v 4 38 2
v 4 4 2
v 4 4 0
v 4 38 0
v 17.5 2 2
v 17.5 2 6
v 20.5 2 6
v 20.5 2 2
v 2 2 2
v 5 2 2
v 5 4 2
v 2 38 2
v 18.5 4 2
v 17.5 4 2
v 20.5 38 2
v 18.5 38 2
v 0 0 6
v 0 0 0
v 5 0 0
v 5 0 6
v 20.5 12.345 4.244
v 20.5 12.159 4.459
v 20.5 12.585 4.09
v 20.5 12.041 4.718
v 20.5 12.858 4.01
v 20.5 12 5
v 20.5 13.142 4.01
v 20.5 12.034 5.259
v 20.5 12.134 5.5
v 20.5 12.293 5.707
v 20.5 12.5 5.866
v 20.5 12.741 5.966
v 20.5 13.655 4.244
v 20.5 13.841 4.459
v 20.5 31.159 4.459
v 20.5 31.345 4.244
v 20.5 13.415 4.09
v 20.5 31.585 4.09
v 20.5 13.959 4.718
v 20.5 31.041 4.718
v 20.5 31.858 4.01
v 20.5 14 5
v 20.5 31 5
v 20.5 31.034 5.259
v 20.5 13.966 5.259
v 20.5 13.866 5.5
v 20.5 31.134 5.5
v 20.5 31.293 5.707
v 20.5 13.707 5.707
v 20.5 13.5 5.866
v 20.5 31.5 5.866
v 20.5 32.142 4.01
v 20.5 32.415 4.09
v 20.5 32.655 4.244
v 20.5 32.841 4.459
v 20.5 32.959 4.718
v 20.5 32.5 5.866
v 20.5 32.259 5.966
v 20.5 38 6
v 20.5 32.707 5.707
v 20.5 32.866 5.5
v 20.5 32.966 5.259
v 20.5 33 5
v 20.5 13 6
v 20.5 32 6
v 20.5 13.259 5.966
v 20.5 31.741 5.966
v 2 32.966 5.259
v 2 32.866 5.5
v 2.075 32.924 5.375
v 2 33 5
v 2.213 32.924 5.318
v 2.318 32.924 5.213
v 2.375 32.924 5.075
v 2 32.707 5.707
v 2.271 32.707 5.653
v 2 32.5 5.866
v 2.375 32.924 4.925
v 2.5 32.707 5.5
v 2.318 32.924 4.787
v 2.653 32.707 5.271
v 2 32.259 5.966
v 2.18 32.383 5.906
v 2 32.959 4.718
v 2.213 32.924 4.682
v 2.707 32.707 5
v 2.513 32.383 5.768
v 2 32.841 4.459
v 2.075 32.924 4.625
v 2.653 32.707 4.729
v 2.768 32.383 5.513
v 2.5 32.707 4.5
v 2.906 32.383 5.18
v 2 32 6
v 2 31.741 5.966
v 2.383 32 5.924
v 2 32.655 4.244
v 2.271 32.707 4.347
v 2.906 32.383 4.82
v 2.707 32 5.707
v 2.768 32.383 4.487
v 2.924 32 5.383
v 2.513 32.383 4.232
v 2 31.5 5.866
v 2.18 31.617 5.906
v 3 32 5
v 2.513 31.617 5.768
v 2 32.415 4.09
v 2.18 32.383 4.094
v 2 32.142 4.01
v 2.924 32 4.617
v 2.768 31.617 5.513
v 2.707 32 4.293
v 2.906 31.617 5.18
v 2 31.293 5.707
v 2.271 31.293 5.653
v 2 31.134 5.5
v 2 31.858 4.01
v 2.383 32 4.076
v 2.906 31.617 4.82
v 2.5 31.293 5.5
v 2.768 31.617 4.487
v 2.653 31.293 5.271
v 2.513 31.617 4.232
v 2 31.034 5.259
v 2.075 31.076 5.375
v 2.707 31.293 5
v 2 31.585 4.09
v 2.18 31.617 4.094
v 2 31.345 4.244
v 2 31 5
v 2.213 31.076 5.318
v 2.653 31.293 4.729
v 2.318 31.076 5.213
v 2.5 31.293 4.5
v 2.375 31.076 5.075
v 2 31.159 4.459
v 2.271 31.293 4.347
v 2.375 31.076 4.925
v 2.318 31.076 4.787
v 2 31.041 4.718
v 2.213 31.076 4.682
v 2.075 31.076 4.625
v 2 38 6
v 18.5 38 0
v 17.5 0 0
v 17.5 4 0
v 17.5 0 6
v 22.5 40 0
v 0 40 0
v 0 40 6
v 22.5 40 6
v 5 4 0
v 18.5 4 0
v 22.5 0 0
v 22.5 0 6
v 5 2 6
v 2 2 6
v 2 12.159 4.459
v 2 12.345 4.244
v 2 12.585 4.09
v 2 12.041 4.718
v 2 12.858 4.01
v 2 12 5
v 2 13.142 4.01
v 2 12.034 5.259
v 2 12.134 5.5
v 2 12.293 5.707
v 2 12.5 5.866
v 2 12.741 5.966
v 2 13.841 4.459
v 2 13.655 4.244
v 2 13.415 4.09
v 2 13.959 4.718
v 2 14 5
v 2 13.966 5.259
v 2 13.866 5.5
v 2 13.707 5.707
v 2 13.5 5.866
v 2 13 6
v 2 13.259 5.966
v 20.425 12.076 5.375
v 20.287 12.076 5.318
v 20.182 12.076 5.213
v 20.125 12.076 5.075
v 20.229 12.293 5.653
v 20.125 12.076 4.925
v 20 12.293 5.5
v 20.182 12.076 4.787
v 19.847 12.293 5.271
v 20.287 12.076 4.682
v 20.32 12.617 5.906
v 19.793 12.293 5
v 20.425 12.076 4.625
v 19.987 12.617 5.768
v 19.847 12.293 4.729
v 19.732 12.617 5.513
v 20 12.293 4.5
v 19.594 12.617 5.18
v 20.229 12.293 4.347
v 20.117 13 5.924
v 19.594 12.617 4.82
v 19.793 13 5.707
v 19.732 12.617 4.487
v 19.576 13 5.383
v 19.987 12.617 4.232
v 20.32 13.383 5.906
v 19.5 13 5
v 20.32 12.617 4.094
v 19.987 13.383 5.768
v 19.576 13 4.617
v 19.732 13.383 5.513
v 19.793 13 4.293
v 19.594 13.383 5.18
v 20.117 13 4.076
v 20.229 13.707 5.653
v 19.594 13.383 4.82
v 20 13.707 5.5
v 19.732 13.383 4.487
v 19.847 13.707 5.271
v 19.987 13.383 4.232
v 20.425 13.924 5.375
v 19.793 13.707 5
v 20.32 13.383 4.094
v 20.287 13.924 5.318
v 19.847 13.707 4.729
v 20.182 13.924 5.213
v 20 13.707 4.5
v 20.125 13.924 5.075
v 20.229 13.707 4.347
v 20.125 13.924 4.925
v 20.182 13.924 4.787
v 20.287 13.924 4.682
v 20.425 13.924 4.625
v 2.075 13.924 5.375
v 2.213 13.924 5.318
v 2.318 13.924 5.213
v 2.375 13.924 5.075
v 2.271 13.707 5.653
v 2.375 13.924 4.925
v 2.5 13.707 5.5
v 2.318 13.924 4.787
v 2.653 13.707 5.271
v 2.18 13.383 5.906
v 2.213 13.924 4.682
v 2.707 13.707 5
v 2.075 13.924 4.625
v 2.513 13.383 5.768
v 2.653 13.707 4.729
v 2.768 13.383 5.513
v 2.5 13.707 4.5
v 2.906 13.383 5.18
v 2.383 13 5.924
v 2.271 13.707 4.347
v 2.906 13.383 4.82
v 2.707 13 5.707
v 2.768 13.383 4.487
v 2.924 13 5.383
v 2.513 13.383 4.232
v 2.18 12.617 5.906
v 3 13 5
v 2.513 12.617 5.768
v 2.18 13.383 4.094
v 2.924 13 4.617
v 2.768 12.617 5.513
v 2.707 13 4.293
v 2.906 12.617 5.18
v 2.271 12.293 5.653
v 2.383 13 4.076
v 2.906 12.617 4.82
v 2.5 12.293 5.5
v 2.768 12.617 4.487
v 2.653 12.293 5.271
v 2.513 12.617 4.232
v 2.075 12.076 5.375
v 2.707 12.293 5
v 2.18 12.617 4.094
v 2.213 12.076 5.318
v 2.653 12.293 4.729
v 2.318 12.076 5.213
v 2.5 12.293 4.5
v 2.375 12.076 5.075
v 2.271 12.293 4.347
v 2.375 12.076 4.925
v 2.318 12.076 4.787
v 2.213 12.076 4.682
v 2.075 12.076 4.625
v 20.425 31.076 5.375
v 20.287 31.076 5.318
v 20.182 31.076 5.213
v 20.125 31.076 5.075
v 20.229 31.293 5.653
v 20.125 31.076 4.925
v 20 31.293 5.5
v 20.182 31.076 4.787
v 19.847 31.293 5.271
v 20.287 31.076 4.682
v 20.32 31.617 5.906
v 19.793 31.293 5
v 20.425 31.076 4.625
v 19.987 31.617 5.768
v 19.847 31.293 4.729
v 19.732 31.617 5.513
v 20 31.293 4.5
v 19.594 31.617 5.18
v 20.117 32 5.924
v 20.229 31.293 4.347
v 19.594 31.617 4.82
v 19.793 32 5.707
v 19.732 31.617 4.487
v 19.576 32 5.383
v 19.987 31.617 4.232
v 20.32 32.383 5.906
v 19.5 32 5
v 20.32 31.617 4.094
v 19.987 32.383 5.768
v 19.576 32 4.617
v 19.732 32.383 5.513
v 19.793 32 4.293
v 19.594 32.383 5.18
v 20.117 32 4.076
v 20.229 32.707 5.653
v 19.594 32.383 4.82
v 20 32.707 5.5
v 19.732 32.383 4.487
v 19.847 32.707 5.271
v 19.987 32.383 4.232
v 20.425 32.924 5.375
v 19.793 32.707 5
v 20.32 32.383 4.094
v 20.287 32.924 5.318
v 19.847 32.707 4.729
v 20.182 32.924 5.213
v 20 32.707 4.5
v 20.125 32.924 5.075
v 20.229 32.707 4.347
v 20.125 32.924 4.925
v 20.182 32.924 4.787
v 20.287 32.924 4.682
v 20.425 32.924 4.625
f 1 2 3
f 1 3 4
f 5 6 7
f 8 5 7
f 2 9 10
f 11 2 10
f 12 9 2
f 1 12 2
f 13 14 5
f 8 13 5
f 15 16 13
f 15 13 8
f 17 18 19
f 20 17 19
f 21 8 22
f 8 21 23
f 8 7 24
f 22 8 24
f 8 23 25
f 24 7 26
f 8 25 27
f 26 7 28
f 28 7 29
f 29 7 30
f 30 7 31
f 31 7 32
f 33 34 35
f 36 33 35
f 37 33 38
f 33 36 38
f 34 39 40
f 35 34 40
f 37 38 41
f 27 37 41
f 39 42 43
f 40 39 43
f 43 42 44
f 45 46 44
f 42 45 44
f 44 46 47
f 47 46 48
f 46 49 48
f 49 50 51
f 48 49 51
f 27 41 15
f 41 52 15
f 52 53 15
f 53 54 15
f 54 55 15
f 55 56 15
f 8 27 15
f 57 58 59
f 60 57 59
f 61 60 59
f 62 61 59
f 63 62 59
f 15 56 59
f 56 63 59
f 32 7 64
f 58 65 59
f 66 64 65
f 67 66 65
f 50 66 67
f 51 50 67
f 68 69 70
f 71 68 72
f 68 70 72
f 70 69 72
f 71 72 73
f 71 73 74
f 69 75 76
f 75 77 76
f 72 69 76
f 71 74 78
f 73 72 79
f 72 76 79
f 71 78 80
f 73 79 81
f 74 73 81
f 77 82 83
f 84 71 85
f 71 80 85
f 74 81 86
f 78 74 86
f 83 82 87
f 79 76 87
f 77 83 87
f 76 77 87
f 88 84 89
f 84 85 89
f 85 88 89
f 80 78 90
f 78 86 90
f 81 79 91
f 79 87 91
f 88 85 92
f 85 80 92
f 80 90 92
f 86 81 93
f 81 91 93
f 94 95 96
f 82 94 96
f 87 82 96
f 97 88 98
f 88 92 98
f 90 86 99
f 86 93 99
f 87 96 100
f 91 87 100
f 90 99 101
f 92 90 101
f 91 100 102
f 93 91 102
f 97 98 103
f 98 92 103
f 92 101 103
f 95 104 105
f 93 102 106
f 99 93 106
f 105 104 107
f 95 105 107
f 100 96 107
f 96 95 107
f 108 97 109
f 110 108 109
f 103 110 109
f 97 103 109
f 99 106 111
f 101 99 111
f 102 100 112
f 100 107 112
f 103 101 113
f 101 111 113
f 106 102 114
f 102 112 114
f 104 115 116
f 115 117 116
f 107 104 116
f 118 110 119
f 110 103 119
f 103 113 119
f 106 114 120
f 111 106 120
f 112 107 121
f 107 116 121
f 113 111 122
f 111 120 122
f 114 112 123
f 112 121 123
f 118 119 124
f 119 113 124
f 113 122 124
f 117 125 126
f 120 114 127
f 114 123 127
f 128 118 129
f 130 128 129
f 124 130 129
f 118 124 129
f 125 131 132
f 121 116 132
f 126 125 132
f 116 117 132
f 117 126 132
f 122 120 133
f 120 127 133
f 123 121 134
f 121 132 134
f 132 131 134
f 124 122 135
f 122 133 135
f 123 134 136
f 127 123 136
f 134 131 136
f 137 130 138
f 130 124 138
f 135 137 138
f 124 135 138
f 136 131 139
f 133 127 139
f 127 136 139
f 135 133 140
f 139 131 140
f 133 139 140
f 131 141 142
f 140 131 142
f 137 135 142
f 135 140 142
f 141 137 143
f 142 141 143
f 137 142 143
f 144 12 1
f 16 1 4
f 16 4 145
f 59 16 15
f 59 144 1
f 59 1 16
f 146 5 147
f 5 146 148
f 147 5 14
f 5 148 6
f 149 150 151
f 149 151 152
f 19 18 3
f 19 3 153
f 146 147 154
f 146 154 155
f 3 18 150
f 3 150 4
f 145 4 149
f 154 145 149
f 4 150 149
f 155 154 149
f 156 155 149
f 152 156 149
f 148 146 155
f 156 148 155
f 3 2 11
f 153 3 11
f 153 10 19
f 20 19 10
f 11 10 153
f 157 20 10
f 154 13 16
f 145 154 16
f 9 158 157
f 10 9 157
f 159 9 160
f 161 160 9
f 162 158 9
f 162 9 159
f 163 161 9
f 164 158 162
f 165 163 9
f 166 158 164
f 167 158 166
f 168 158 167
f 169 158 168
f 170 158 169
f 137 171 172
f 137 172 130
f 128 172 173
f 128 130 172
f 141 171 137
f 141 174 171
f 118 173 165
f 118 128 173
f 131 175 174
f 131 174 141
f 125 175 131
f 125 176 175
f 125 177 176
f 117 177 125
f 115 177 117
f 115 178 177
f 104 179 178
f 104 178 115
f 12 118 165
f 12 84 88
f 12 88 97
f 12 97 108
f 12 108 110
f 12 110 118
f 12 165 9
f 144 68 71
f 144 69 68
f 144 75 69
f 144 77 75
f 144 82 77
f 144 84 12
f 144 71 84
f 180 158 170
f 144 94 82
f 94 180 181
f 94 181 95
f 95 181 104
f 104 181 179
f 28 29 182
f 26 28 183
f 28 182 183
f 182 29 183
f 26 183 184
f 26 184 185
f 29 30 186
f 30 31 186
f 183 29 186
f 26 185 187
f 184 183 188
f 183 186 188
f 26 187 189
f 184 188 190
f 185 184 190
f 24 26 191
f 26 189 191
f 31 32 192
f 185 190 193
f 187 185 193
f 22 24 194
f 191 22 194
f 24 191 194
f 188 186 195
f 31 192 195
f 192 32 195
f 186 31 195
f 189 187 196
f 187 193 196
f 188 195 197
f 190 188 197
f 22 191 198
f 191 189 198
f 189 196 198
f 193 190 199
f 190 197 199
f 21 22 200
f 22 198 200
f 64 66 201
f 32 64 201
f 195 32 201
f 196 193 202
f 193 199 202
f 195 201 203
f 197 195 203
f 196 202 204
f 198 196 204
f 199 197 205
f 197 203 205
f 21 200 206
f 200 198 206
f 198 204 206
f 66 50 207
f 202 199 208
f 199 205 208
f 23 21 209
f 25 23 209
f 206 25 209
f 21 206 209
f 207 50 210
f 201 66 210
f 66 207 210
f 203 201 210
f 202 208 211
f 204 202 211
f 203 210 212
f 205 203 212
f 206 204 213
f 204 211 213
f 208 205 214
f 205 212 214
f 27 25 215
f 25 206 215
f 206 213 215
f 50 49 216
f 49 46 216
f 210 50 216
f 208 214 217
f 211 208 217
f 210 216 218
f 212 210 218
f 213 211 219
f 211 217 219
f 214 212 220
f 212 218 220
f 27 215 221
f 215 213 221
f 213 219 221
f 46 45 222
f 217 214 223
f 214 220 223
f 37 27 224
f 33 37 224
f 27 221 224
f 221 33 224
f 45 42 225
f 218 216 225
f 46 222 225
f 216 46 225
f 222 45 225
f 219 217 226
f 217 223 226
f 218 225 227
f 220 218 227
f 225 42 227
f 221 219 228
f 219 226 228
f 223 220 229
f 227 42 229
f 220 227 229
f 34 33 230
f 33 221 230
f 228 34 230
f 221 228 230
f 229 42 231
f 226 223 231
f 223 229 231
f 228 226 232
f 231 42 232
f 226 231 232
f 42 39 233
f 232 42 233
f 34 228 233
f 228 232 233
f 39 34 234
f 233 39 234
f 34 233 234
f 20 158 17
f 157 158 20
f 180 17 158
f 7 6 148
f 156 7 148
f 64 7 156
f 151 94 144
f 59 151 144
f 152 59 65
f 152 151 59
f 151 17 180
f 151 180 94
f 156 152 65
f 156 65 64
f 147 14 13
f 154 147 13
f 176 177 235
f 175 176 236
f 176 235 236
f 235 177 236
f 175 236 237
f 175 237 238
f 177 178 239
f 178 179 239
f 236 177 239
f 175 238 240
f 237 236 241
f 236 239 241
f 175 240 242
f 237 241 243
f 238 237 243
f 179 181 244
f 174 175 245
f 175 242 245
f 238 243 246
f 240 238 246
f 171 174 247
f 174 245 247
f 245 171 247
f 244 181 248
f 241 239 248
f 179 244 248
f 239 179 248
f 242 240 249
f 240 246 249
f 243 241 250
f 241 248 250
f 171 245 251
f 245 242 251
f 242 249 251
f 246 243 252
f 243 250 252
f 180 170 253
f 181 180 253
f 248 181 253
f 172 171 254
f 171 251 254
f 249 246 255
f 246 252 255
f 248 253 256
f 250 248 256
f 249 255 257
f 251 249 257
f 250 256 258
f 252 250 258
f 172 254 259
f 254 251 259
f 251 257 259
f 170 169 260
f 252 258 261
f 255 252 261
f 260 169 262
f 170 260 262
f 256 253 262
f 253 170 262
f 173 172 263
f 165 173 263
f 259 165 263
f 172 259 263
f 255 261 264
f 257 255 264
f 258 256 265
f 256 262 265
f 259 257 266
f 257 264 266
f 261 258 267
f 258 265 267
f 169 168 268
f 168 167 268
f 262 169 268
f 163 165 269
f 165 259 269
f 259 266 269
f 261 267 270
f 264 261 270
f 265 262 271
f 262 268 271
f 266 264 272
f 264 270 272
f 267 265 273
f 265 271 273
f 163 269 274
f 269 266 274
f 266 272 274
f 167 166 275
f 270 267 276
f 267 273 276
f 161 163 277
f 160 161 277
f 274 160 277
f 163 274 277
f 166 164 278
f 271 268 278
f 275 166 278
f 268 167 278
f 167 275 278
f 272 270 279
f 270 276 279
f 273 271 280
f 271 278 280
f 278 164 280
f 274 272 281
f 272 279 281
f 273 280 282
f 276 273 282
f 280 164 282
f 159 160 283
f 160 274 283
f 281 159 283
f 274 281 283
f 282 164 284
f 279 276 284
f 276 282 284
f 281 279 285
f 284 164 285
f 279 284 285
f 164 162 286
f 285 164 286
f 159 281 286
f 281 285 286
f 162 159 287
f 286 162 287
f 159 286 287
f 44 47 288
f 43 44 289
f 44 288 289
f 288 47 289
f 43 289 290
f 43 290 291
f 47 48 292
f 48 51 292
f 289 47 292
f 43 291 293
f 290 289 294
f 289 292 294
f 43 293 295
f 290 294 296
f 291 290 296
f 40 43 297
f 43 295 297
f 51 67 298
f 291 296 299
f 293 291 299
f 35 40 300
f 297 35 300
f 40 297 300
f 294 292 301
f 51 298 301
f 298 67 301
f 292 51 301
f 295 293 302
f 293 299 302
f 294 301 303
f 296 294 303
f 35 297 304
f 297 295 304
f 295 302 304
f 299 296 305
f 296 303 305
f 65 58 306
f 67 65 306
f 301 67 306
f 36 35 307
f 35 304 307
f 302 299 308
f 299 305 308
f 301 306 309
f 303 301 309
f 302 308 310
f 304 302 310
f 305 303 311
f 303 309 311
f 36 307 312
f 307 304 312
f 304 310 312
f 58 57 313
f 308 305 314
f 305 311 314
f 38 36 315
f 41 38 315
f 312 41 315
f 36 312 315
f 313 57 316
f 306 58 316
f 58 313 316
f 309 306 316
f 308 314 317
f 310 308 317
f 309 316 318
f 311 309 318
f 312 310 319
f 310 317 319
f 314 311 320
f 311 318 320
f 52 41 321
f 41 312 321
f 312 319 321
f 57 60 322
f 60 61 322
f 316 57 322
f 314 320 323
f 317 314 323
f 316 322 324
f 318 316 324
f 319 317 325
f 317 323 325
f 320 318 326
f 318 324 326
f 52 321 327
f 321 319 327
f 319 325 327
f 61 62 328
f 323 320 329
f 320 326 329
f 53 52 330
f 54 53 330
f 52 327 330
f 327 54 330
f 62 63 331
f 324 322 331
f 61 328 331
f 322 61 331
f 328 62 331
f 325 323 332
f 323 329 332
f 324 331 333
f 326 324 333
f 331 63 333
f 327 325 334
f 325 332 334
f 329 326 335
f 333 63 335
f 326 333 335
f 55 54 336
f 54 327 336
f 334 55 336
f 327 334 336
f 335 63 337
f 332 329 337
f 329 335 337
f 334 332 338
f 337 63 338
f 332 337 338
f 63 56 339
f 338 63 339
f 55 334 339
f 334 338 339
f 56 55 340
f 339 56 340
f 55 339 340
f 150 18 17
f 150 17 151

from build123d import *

# Parameters (mm, degrees)
SKETCH064_W         = 22.5
SKETCH064_H         = 40
PAD034_DEPTH        = 6
SKETCH065_W         = 18.5
SKETCH065_H         = 36
POCKET020_DEPTH     = 4
SKETCH062_W         = 14.5
SKETCH062_H         = 32
POCKET021_DEPTH     = 2.001
SKETCH063_W         = 12.5
SKETCH063_H         = 4
POCKET022_DEPTH     = 6.001
REVOLUTION005_ANGLE = -180
REVOLUTION006_ANGLE = 180
SKETCH084_W         = 14.5
SKETCH084_H         = 2
POCKET029_DEPTH     = 2.001


with BuildPart() as part:
    # Sketch064 → Pad034 (new body)
    with BuildSketch(Plane.XY):
        with Locations((11.25, 20)):
            Rectangle(SKETCH064_W, SKETCH064_H)
    extrude(amount=PAD034_DEPTH)

    # Sketch065 (on Face6 of Pad034) → Pocket020 (cut)
    with BuildSketch(Plane.XY.offset(6)):
        with Locations((11.25, 20)):
            Rectangle(SKETCH065_W, SKETCH065_H)
    extrude(amount=-POCKET020_DEPTH, mode=Mode.SUBTRACT)

    # Sketch062 (on Face11 of Pocket020) → Pocket021 (cut, through all)
    with BuildSketch(Plane.XY.offset(2)):
        with Locations((11.25, 20)):
            Rectangle(SKETCH062_W, SKETCH062_H)
    extrude(amount=-POCKET021_DEPTH, mode=Mode.SUBTRACT)

    # Sketch063 (on Face5 of Pocket021) → Pocket022 (cut, through all)
    with BuildSketch(Plane.XY.offset(6)):
        with Locations((11.25, 2)):
            Rectangle(SKETCH063_W, SKETCH063_H)
    extrude(amount=-POCKET022_DEPTH, mode=Mode.SUBTRACT)

    # Sketch067 (on Face20 of Pocket022) → Revolution005 (revolve)
    with BuildSketch(Plane.YZ.offset(2)):
        with BuildLine():
            ThreePointArc((14, 5), (13, 6), (12, 5))
            Line((12, 5), (14, 5))
        make_face()
        with BuildLine():
            ThreePointArc((33, 5), (32, 6), (31, 5))
            Line((31, 5), (33, 5))
        make_face()
    revolve(axis=Axis((2, 14, 5), (0, -1, 0)), revolution_arc=REVOLUTION005_ANGLE)

    # Sketch068 (on Face19 of Revolution005) → Revolution006 (revolve)
    with BuildSketch(Plane(origin=(20.5, 0, 0), x_dir=(0, -1, 0), z_dir=(-1, 0, 0))):
        with BuildLine():
            ThreePointArc((-31, 5), (-32, 6), (-33, 5))
            Line((-33, 5), (-31, 5))
        make_face()
        with BuildLine():
            ThreePointArc((-12, 5), (-13, 6), (-14, 5))
            Line((-14, 5), (-12, 5))
        make_face()
    revolve(axis=Axis((20.5, 31, 5), (0, -1, 0)), revolution_arc=REVOLUTION006_ANGLE)

    # Sketch084 (on Face15 of Revolution006) → Pocket029 (cut, through all)
    with BuildSketch(Plane.XY.offset(2)):
        with Locations((11.25, 37)):
            Rectangle(SKETCH084_W, SKETCH084_H)
    extrude(amount=-POCKET029_DEPTH, mode=Mode.SUBTRACT)


solid = part.part
